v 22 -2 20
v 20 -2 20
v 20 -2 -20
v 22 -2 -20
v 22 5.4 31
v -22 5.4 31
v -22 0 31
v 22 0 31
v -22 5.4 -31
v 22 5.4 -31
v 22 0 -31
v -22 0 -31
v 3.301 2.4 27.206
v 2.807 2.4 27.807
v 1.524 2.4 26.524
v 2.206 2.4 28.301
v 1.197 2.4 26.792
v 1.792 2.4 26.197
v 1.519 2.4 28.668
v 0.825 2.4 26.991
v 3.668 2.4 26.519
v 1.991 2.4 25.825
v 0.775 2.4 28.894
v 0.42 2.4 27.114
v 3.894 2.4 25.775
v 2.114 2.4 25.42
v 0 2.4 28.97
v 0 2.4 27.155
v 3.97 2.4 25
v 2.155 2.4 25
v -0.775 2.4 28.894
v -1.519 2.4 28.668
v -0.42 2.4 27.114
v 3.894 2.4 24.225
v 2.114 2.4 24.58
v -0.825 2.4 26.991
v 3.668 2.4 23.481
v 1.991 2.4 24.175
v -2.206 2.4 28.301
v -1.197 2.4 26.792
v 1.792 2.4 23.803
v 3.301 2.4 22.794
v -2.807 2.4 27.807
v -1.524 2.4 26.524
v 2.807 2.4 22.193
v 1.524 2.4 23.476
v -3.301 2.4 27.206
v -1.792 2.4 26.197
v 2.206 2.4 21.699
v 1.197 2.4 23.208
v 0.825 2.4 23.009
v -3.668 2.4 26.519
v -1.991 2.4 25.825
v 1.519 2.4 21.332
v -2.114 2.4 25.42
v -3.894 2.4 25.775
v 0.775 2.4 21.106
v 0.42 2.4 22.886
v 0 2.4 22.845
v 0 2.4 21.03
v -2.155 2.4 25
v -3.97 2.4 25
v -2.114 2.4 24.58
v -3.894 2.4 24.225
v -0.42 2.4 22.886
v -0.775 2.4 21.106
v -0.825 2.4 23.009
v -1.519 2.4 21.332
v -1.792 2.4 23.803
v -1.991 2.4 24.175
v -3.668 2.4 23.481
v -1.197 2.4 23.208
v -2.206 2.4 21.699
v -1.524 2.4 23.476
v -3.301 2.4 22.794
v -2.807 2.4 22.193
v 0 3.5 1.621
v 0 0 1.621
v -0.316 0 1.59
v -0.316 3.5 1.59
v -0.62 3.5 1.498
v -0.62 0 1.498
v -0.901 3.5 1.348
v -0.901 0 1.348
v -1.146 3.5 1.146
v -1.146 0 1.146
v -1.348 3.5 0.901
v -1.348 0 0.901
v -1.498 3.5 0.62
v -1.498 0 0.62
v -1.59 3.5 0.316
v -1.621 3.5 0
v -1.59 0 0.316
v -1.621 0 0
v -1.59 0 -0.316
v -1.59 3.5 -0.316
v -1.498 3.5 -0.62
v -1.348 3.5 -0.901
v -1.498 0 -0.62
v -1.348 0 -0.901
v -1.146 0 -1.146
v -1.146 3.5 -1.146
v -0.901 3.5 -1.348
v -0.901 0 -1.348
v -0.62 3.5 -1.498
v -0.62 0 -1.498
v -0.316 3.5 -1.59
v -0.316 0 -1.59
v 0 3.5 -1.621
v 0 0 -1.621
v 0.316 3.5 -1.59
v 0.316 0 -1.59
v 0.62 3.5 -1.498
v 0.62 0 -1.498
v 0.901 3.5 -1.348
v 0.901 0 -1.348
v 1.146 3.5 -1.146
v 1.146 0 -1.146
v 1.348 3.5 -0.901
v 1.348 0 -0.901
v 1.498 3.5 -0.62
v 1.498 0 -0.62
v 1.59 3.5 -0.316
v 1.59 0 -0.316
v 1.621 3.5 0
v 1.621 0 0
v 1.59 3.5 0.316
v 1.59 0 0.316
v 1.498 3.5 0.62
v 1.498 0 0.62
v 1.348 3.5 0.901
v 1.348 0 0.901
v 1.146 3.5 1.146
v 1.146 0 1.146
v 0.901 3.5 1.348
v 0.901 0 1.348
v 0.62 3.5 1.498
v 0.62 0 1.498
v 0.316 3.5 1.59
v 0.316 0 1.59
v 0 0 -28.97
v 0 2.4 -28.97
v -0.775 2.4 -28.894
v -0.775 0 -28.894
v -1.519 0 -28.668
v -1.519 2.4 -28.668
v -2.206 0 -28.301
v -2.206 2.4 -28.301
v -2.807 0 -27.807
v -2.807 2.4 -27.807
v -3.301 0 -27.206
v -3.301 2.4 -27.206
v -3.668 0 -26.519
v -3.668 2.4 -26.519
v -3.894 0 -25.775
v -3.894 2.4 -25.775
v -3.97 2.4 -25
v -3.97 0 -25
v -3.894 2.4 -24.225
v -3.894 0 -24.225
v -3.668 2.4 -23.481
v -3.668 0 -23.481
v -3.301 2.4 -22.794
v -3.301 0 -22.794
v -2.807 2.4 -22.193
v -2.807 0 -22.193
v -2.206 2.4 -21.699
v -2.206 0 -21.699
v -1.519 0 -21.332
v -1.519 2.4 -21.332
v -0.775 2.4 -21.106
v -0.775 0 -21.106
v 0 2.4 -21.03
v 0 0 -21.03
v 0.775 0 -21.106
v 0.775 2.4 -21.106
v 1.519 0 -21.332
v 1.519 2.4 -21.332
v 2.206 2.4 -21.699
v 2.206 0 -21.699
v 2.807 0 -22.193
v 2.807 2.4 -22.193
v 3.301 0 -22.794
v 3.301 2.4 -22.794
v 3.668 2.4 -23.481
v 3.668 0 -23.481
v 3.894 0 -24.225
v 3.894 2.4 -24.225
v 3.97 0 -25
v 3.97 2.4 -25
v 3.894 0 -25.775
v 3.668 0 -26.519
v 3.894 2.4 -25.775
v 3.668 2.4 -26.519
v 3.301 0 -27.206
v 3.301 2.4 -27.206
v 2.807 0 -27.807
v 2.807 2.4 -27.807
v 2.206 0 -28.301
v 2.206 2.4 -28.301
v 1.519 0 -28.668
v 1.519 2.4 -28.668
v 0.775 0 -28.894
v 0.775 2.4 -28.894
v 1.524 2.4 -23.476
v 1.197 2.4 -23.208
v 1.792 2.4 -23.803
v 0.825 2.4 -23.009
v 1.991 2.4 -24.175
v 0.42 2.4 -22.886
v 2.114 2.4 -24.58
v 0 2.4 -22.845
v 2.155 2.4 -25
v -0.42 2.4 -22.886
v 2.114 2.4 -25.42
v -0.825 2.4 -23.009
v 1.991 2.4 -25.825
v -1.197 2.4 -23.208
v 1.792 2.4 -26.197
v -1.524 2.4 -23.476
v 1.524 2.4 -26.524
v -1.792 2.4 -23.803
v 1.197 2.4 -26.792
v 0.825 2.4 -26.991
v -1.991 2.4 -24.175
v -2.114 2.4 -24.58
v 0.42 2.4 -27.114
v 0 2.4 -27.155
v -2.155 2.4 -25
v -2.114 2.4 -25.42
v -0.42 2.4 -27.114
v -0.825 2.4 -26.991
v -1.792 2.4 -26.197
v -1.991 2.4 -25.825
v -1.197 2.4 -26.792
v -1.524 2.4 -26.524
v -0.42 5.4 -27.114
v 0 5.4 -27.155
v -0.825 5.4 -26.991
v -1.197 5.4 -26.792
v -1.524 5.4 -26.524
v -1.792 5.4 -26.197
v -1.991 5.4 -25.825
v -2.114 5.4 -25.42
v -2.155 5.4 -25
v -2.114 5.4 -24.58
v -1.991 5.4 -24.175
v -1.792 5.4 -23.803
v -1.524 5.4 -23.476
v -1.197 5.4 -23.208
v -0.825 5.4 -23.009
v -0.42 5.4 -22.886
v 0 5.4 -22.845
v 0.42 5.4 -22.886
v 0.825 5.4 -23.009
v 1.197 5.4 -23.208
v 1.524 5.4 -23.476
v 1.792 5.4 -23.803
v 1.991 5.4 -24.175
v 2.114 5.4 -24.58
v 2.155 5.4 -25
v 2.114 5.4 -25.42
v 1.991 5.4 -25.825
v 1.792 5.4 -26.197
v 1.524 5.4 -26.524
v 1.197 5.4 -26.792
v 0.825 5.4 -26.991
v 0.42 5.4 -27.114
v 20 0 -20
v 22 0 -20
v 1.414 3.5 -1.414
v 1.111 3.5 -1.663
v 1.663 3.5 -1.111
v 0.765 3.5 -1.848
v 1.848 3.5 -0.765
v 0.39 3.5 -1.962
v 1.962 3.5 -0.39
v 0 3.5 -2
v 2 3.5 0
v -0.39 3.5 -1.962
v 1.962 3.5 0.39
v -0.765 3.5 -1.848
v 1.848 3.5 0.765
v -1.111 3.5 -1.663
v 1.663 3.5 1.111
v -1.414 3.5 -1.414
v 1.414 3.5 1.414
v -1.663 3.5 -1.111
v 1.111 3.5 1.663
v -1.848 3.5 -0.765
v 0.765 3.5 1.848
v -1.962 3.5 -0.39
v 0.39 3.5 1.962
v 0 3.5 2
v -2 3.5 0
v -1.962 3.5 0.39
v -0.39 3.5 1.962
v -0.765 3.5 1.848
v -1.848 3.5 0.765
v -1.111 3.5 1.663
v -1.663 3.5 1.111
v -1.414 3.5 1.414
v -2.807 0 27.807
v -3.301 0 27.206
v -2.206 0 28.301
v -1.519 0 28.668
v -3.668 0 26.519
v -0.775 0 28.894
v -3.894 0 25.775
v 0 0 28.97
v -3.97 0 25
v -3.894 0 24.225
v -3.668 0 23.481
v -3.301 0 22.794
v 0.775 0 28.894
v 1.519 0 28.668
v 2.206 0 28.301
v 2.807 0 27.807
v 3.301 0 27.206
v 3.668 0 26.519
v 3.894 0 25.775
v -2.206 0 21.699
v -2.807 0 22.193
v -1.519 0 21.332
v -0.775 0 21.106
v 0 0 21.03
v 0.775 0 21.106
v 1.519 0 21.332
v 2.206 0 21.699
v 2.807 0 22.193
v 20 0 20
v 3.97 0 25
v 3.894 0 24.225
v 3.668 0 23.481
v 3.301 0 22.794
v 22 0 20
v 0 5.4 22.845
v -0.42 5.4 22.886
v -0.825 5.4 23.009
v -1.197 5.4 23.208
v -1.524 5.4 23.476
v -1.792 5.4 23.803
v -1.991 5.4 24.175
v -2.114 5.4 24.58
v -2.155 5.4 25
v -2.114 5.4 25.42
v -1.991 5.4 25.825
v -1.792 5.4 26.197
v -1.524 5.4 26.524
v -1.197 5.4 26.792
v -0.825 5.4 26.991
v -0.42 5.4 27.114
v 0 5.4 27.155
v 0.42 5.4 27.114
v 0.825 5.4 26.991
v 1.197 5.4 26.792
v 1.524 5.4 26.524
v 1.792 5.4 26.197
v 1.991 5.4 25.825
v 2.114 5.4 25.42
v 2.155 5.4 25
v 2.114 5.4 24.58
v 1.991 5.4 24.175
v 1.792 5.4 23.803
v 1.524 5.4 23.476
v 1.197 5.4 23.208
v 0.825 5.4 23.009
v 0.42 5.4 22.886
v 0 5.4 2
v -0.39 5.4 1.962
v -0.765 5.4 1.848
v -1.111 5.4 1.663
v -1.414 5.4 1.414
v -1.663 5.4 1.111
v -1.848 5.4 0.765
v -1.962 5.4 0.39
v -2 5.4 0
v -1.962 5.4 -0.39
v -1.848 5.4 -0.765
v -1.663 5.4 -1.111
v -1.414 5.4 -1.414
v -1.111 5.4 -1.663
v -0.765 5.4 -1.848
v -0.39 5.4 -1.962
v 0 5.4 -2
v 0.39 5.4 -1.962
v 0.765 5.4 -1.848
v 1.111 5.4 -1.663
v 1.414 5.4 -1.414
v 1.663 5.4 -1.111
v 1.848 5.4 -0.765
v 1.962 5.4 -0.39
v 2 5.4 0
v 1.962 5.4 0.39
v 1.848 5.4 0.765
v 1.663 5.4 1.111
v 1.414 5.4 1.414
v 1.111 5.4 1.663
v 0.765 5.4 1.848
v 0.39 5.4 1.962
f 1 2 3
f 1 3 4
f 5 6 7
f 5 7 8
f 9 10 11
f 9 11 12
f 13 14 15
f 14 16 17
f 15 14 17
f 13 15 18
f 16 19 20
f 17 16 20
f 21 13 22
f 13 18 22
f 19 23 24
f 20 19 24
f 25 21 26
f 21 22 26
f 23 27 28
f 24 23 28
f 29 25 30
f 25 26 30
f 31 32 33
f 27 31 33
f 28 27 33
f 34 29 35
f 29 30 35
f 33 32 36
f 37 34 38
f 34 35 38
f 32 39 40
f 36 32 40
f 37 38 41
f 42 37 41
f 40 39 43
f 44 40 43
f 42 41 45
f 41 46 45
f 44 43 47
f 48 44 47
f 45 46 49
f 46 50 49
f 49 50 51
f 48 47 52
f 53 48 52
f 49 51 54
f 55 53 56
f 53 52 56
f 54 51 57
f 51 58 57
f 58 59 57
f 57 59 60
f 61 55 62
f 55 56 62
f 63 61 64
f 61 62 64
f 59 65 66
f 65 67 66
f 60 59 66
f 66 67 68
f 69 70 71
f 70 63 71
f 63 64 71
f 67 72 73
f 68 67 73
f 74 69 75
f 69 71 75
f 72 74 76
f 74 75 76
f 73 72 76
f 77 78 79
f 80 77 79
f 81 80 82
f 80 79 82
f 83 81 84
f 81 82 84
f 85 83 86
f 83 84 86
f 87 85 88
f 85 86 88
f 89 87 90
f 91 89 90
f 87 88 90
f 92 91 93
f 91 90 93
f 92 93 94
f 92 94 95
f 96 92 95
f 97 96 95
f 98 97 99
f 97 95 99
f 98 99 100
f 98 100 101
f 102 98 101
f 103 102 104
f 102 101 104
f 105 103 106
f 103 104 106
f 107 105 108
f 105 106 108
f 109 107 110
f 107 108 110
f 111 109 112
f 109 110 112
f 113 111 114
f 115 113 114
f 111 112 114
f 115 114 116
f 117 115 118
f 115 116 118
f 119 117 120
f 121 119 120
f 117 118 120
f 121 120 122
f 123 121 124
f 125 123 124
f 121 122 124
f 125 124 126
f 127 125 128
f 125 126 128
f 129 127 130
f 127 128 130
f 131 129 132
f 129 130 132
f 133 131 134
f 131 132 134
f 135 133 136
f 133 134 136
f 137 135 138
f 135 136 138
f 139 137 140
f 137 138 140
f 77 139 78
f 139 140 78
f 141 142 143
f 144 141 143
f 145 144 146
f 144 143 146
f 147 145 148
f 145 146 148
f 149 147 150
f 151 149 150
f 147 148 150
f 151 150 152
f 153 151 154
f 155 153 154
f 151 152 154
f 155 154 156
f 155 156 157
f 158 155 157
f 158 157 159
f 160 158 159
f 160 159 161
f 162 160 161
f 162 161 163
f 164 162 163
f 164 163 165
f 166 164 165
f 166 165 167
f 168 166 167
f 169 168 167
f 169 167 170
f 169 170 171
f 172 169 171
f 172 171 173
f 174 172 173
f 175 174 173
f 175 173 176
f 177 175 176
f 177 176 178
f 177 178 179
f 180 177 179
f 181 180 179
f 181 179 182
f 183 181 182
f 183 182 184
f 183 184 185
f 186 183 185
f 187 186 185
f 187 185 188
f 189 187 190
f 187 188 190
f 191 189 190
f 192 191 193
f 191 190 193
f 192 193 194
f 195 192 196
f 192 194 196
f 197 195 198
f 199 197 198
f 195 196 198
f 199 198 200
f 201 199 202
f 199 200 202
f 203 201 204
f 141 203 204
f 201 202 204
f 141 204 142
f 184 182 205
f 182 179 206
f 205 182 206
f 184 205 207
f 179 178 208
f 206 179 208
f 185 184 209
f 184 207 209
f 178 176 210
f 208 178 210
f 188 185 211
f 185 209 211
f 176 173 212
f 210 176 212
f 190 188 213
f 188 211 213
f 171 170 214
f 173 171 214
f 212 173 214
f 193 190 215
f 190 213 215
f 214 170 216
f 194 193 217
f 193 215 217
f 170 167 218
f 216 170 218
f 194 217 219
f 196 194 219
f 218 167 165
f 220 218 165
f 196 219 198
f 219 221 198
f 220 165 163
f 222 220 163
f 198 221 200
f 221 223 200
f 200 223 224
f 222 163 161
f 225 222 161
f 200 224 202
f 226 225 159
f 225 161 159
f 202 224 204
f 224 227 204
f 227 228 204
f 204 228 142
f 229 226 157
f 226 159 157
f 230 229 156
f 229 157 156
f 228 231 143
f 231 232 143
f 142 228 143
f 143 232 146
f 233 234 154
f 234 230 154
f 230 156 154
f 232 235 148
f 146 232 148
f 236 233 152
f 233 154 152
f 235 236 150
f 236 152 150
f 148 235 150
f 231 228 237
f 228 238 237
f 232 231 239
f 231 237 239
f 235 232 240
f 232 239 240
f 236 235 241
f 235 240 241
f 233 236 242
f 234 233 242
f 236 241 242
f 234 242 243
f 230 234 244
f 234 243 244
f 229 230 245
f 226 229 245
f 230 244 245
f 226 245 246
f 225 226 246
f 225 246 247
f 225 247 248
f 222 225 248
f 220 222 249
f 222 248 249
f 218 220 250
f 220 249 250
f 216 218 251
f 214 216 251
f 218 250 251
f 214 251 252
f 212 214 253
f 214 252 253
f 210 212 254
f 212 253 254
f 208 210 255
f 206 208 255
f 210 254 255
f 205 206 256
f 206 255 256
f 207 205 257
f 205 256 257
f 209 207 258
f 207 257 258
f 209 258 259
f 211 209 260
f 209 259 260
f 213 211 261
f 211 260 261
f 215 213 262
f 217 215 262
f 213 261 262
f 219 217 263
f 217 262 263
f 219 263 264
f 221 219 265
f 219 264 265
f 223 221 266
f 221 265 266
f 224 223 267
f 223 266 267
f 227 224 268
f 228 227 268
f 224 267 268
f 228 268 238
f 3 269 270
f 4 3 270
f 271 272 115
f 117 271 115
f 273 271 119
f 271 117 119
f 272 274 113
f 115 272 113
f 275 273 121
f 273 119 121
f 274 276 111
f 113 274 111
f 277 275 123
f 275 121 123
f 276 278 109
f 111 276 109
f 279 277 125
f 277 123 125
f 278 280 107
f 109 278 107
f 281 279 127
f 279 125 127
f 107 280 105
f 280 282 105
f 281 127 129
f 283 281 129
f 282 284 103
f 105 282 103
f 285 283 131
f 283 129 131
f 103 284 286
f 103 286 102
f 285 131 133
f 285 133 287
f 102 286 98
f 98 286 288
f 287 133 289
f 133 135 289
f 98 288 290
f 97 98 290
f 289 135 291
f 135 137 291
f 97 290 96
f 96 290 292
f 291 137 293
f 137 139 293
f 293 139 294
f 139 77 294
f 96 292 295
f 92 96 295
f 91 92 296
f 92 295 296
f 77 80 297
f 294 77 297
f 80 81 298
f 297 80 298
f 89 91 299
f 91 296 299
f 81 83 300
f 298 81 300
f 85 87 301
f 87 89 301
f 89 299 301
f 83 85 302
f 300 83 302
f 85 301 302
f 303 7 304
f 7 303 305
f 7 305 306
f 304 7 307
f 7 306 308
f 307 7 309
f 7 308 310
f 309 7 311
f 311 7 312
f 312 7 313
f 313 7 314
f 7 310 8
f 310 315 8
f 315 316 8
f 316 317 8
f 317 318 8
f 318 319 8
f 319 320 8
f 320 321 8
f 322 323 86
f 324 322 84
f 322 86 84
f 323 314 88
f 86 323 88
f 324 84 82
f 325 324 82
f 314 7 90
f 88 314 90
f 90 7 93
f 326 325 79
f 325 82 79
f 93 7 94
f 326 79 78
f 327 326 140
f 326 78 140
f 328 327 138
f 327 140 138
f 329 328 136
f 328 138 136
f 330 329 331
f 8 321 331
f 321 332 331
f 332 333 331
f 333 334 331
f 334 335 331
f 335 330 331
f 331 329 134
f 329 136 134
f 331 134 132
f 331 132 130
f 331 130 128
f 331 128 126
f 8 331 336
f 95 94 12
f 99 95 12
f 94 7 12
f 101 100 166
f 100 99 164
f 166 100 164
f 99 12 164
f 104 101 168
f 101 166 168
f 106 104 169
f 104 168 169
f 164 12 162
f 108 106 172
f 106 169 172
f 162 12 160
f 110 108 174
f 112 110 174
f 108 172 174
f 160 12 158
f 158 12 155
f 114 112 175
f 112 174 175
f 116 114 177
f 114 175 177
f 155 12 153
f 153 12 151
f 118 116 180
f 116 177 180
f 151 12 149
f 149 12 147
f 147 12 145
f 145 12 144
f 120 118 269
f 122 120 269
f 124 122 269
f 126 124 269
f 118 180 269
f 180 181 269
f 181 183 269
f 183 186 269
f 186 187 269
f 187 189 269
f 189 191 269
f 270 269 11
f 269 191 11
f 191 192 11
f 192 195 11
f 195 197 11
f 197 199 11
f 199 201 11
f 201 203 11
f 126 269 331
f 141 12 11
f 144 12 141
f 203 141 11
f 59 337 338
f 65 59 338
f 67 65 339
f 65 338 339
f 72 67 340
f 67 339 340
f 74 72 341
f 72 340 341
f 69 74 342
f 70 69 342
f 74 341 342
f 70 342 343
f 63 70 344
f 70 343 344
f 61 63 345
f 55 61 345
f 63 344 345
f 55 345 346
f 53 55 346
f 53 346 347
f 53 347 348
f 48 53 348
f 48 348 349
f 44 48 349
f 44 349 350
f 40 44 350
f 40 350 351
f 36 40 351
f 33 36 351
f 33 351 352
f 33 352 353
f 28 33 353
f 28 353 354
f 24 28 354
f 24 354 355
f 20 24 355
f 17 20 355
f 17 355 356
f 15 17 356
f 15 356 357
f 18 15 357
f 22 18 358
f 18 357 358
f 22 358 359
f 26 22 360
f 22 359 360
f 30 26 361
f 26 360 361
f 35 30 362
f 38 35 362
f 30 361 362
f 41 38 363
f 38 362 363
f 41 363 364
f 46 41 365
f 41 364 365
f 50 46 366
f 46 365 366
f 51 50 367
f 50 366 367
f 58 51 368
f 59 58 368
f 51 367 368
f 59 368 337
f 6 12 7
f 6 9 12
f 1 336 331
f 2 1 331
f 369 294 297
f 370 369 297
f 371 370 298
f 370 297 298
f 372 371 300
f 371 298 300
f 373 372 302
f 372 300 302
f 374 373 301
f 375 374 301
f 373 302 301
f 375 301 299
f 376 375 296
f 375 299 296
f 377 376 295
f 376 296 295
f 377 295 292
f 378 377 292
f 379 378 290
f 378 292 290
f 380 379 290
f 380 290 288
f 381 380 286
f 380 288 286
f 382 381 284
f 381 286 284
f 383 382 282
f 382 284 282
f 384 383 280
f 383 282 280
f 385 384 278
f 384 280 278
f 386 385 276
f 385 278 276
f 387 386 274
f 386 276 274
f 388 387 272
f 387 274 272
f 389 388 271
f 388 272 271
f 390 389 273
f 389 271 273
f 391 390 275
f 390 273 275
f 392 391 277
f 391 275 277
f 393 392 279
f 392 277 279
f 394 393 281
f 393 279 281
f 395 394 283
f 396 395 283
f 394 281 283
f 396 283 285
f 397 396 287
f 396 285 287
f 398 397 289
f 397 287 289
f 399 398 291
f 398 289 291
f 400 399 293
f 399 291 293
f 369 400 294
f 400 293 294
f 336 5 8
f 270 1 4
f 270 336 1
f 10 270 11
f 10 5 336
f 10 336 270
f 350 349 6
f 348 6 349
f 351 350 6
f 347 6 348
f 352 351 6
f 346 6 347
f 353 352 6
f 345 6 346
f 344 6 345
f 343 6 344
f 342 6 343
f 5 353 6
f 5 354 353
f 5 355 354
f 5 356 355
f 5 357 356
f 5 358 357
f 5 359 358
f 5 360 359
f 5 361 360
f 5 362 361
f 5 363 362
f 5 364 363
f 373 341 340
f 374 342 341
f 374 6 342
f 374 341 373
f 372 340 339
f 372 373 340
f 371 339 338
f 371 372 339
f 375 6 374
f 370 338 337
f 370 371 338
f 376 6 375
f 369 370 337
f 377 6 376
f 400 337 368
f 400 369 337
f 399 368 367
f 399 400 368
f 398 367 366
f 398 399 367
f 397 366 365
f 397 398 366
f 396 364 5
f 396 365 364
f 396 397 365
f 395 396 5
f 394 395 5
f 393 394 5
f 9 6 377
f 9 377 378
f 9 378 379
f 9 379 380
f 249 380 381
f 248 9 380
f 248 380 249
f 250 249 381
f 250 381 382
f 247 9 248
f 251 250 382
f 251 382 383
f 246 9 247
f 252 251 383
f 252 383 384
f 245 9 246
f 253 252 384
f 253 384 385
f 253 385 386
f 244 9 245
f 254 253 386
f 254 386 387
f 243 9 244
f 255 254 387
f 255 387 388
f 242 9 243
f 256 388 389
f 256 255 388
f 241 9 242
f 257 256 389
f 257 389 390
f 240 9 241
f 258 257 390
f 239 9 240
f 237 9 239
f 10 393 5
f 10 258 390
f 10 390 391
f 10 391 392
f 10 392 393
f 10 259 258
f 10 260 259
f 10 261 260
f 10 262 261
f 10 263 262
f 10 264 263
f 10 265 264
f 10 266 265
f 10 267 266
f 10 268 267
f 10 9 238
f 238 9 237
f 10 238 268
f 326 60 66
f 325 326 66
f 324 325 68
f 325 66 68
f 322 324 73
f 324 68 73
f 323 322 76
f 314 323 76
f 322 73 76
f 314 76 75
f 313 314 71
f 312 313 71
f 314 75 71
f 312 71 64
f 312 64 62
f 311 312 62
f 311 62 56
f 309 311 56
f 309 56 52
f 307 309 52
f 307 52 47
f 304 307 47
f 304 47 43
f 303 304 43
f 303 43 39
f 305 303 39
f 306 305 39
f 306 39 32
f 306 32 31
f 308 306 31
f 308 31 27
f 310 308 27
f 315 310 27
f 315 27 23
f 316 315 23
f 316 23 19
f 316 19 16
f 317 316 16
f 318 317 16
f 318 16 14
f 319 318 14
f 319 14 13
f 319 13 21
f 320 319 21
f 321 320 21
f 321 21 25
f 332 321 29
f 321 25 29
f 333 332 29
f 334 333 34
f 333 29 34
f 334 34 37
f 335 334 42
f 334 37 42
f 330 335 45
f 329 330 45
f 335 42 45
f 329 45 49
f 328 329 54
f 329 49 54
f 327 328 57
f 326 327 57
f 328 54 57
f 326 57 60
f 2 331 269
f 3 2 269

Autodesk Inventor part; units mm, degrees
ref_plane "YZ Plane" through (0, 0, 0) normal (1, 0, 0) x (0, 1, 0)
ref_plane "XZ Plane" through (0, 0, 0) normal (0, 1, 0) x (-1, 0, 0)
ref_plane "XY Plane" through (0, 0, 0) normal (0, 0, 1) x (1, 0, 0)
sketch "Sketch1" plane through (0, 0, 0) normal (0, 1, 0) x (-1, 0, 0)
  line L0 (22, 20) -> (-22, 20)
  line L1 (-22, 20) -> (-22, -20)
  line L2 (-22, -20) -> (22, -20)
  line L3 (22, -20) -> (22, 20)
  line L4 (22, 20) -> (-22, -20) construction
  line L5 (-22, 20) -> (22, -20) construction
  point P0 (0, 0)
  dimension "CUBE_DIM" = 40
  dimension "d1" = 44
extrude "Extrusion1" add sketch "Sketch1" along normal blind 5.4
sketch "Sketch2" plane through (0, 5.4, 0) normal (0, 1, 0) x (1, 0, 0)
  line L0 (-22, -31) -> (22, -31)
  line L1 (22, -31) -> (22, 31)
  line L2 (22, 31) -> (-22, 31)
  line L3 (-22, 31) -> (-22, -31)
  line L4 (-22, -31) -> (22, 31) construction
  line L5 (22, -31) -> (-22, 31) construction
  line L6 (-22, 20) -> (-22, -20) projected
  line L7 (-22, -20) -> (22, -20)
  line L8 (22, 20) -> (-22, 20) projected
  line L9 (-22, 20) -> (22, 20)
  point P0 (0, 0)
  dimension "BASE_LENGTH" = 62
  dimension "BASE_WIDTH" = 44
extrude "Extrusion2" add sketch "Sketch2" against normal blind 5.4
sketch "Sketch5" plane through (0, 0, 0) normal (0, -1, 0) x (1, 0, 0)
  line L0 (22, 20) -> (20, 20)
  line L1 (20, 20) -> (20, -20)
  line L2 (20, -20) -> (22, -20)
  line L3 (22, -20) -> (22, 20)
  line L4 (22, 31) -> (22, -31) projected
  point P0 (0, 0)
  dimension "d31" = 40
  dimension "d32" = 20
  dimension "d33" = 0
  dimension "d34" = 2
extrude "Extrusion3" add sketch "Sketch5" along normal blind 2
sketch "Sketch3" plane through (0, 5.4, 0) normal (0, 1, 0) x (1, 0, 0)
  circle A0 centre (0, 0) radius 2.9522
  line L0 (20, 20) -> (20, -20) projected
  dimension "d35" = 20
hole "Hole1" at (0, 5.4, 0) direction (0, -1, 0) diameter 3.242 depth 5.4 counterbore diameter 4 counterbore depth 1.9 thread size "M4x0.7" class "6H" standard "ANSI Metric M Profile"
sketch "Sketch4" plane through (0, 0, 0) normal (0, -1, 0) x (1, 0, 0)
  circle A0 centre (0, -25) radius 1.0924
  circle A1 centre (0, 25) radius 1.3036
  line L0 (-22, -31) -> (22, -31) projected
  line L1 (22, 31) -> (-22, 31) projected
  point P0 (0, 0)
  point P1 (-22, -29)
  point P2 (-22, 29)
  point P3 (22, -31)
  point P4 (-22, 31)
  dimension "d22" = 6
  dimension "d23" = 6
hole "Hole2" at (0, 0, 25) at (0, 0, -25) direction (0, 1, 0) diameter 4.31 depth 12.3 counterbore diameter 7.94 counterbore depth 2.4 clearance for "Socket Head Cap Screw" size "#8" standard "Ansi Unified Screw Threads"
equation "\"PLATFORM_HEIGHT\" = BEAM_HEIGHT - 0.5 * CUBE_DIM"
equation "\"BASE_LENGTH\" = CUBE_DIM + 2 * WING_SIZE"
equation "\"d32\" = 0.5 * d31"
equation "\"d13\" = PLATFORM_HEIGHT"
equation "\"WING_SIZE\" = 11"
equation "\"BEAM_HEIGHT\" = 25.4"
properties part number "EOM mount"
